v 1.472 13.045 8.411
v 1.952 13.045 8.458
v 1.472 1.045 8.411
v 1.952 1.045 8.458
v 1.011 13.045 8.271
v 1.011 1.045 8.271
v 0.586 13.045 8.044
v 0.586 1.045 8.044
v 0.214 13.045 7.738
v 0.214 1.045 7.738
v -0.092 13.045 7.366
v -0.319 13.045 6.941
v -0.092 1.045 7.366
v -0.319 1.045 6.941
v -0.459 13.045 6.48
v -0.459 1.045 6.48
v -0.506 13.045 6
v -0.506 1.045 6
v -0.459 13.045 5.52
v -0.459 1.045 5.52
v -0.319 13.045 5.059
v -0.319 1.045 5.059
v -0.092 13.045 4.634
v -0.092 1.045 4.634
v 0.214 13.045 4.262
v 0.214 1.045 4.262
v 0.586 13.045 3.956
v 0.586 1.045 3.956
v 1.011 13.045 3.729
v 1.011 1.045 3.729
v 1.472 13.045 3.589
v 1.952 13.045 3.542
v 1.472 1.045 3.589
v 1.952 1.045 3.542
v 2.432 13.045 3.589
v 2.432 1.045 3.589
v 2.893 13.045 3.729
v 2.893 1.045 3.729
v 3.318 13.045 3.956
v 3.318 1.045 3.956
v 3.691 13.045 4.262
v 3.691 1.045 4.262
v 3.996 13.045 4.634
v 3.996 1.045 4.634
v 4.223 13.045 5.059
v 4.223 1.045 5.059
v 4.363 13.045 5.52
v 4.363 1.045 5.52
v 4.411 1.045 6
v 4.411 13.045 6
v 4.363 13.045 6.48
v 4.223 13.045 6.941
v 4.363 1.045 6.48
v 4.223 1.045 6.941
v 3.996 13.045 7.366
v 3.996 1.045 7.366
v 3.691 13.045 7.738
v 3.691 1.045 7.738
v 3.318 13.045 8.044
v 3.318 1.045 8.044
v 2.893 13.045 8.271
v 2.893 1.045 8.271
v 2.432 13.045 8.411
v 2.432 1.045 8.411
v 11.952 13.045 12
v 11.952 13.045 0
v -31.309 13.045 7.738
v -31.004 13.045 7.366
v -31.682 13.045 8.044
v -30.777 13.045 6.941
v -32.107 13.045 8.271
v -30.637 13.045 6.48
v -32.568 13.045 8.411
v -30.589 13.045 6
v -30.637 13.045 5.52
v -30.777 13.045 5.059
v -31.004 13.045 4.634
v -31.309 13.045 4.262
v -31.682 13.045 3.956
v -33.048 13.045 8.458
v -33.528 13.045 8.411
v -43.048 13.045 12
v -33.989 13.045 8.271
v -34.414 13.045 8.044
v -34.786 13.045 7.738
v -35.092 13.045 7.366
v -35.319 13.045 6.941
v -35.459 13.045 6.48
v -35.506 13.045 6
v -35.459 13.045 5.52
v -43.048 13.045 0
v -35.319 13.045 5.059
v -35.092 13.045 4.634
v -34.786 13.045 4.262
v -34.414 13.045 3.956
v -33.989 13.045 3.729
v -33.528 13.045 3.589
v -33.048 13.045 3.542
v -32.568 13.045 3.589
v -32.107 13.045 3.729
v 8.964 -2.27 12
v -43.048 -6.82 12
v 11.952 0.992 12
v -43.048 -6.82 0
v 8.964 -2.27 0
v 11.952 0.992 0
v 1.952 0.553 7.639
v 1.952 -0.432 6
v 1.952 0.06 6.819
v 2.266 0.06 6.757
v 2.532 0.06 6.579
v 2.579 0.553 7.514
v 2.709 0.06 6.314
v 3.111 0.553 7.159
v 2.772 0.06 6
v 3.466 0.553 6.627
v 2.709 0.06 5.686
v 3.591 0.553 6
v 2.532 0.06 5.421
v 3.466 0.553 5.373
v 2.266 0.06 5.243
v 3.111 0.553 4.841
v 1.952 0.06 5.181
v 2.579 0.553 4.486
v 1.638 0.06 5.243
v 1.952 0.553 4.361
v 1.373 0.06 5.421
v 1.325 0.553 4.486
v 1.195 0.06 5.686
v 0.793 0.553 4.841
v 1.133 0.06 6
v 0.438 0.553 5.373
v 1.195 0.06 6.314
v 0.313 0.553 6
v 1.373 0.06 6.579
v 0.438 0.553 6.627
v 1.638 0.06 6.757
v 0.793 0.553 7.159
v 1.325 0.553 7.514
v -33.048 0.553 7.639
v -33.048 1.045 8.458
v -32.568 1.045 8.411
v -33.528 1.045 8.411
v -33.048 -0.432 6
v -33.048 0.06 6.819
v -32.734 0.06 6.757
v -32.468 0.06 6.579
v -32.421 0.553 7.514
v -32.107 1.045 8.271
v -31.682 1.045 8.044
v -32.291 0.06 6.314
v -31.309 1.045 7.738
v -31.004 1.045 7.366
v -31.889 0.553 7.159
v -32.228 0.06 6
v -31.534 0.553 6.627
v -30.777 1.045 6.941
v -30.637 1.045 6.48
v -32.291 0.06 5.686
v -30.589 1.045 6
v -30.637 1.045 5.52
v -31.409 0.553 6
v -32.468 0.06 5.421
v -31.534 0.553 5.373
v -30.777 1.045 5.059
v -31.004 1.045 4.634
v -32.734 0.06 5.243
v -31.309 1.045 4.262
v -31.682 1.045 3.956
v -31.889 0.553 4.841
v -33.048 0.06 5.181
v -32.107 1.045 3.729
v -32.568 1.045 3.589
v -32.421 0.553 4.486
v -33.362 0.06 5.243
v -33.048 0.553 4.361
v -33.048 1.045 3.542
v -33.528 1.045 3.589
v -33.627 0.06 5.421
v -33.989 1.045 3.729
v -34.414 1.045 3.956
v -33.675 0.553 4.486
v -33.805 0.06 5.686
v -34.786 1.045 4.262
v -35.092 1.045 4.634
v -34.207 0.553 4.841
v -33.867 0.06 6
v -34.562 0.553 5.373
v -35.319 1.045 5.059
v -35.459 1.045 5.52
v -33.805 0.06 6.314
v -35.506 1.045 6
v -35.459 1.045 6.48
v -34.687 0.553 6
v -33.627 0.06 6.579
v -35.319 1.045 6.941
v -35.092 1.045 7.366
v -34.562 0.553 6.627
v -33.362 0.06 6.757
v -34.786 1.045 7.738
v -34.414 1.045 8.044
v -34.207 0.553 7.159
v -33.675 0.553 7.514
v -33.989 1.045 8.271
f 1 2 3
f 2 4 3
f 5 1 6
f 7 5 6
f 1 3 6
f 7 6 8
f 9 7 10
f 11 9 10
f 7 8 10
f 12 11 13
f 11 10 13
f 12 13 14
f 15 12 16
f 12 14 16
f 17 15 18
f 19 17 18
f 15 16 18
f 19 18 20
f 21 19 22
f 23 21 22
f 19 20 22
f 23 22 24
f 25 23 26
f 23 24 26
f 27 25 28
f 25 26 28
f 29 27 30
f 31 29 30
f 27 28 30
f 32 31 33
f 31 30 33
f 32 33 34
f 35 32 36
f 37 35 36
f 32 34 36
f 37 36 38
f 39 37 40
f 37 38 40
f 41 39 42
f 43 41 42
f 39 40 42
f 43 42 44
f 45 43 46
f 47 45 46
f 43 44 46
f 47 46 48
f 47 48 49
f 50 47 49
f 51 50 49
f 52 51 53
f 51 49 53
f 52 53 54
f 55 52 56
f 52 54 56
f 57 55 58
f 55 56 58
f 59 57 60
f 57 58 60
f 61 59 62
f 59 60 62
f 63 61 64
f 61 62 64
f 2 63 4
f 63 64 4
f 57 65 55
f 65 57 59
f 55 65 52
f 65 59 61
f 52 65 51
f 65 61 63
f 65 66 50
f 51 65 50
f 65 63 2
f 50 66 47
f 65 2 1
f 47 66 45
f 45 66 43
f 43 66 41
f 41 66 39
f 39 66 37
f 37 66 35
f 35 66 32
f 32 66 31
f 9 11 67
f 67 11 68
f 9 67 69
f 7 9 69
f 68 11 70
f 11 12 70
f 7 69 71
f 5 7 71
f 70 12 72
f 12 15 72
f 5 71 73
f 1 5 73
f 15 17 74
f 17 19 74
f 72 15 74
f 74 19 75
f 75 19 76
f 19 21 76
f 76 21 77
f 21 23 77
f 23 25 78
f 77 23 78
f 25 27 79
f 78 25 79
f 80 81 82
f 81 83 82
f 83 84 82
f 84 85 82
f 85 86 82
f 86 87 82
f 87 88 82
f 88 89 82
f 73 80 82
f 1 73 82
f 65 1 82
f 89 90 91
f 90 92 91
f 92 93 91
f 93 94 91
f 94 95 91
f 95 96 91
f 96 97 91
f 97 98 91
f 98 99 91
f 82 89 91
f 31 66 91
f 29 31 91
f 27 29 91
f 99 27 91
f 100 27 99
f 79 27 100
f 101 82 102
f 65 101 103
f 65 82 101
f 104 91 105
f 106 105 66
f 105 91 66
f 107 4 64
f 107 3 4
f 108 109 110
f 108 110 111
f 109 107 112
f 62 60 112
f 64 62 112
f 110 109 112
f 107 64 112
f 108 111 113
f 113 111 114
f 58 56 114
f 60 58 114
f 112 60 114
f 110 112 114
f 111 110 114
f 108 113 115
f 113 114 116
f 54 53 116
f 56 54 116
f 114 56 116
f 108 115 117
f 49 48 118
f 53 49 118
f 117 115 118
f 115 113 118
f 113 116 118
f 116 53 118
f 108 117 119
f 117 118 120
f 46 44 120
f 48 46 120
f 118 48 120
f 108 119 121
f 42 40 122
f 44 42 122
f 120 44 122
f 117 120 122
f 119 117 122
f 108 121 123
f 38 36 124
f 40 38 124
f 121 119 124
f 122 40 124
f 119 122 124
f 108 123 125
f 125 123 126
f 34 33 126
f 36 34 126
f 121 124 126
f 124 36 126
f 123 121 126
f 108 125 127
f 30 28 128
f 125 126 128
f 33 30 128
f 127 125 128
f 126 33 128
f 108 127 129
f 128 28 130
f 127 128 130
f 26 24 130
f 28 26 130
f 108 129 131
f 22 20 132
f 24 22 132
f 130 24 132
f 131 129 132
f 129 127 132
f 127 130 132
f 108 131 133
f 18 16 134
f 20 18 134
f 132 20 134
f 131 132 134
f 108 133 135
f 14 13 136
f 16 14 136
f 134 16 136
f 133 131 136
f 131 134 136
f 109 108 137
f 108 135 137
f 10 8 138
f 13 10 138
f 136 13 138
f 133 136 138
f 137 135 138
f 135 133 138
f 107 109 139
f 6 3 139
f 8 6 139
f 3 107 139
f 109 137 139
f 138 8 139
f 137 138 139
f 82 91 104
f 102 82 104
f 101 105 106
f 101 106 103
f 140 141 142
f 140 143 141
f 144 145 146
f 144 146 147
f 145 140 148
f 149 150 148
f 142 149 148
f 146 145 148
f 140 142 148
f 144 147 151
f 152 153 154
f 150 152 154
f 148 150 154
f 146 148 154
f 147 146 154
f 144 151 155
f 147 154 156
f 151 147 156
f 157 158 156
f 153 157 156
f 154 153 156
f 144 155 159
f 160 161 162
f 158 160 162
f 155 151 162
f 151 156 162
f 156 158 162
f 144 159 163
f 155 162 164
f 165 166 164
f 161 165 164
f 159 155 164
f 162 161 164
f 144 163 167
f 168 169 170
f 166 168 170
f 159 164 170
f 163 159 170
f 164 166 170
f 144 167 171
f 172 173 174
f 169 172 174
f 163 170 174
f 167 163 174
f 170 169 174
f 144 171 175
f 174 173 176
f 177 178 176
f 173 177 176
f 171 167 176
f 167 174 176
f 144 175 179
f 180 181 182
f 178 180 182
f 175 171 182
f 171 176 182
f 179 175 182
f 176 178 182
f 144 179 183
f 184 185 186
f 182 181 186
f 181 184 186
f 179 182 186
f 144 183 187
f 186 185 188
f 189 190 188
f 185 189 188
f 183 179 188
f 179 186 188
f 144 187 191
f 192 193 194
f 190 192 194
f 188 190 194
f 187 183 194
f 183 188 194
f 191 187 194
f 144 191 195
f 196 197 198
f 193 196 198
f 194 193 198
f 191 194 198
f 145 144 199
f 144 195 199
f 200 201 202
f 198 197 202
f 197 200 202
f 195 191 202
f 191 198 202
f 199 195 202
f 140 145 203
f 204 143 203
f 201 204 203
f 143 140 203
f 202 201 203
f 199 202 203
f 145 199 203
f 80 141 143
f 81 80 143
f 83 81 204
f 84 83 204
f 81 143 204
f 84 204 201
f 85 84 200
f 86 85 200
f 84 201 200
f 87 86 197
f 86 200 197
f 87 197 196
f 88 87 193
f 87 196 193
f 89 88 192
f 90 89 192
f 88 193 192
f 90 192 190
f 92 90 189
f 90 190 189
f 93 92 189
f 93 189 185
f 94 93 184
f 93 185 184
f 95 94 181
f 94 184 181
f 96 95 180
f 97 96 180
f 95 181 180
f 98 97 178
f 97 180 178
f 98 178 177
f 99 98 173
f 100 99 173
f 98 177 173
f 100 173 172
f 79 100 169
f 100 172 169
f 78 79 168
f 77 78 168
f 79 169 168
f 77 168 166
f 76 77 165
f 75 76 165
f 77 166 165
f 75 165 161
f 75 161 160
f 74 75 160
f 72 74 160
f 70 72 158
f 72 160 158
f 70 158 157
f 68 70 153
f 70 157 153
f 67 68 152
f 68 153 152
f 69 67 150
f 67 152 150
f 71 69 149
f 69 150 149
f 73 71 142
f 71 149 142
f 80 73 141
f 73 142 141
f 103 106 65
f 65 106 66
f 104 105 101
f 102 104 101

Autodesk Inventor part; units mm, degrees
ref_plane "YZ Plane" through (0, 0, 0) normal (1, 0, 0) x (0, 1, 0)
sketch "スケッチ2" plane through (0, 0, 0) normal (0, 0, 1) x (1, 0, 0)
  line L0 (-43.0479, 13.0453) -> (-43.0479, -8.9547)
  line L1 (-43.0479, -8.9547) -> (11.9521, -8.9547)
  line L2 (11.9521, -8.9547) -> (11.9521, 13.0453)
  line L3 (11.9521, 13.0453) -> (-43.0479, 13.0453)
  point P0 (0, 0)
  dimension "d3" = 55
  dimension "d16" = 22
extrude "押し出し2" add sketch "スケッチ2" along normal blind 12
sketch "スケッチ4" plane through (-43.0479, 13.0453, 0) normal (0, 1, 0) x (1, 0, 0)
  line L0 (55, 0) -> (55, -12) projected
  line L1 (0, 0) -> (0, -12) projected
  line L2 (0, -6) -> (55, -6)
  line L3 (0, -12) -> (55, -12) projected
  line L4 (0, 0) -> (55, 0) projected
  point P0 (10, -6)
  point P1 (45, -6)
  dimension "d17" = 10
  dimension "d18" = 35
hole "穴2" at (-33.0479, 13.0453, 6) at (1.9521, 13.0453, 6) direction (0, -1, 0) diameter 4.917 depth 12 tip angle 118 thread size "M6x1" class "6H" standard "ISO Metric profile"
ref_plane "IN" through (-43.0479, -7.6232, 0) normal (-0.0872, 0.9962, 0) x (0, 0, 1)
ref_plane "OUT" through (-43.1176, -6.8262, 0) normal (-0.0872, 0.9962, 0) x (0, 0, 1)
sketch "スケッチ6" plane through (-43.1176, -6.8262, 0) normal (-0.0872, 0.9962, 0) x (0, 0, 1)
  line L0 (15.0202, 58.9603) -> (-3.3874, 58.9603)
  line L1 (-3.3874, 58.9603) -> (-3.3874, -4.1514)
  line L2 (-3.3874, -4.1514) -> (15.0202, -4.1514)
  line L3 (15.0202, -4.1514) -> (15.0202, 58.9603)
extrude "押し出し4" cut sketch "スケッチ6" against normal through all
chamfer "面取り1" distance 3 angle 45 1 edges at (11.9521, -2.0083, 6)
properties part number "100014" material "STEEL - HIGH GRADE ALLOY, BLACK OXIDE FINISH"
